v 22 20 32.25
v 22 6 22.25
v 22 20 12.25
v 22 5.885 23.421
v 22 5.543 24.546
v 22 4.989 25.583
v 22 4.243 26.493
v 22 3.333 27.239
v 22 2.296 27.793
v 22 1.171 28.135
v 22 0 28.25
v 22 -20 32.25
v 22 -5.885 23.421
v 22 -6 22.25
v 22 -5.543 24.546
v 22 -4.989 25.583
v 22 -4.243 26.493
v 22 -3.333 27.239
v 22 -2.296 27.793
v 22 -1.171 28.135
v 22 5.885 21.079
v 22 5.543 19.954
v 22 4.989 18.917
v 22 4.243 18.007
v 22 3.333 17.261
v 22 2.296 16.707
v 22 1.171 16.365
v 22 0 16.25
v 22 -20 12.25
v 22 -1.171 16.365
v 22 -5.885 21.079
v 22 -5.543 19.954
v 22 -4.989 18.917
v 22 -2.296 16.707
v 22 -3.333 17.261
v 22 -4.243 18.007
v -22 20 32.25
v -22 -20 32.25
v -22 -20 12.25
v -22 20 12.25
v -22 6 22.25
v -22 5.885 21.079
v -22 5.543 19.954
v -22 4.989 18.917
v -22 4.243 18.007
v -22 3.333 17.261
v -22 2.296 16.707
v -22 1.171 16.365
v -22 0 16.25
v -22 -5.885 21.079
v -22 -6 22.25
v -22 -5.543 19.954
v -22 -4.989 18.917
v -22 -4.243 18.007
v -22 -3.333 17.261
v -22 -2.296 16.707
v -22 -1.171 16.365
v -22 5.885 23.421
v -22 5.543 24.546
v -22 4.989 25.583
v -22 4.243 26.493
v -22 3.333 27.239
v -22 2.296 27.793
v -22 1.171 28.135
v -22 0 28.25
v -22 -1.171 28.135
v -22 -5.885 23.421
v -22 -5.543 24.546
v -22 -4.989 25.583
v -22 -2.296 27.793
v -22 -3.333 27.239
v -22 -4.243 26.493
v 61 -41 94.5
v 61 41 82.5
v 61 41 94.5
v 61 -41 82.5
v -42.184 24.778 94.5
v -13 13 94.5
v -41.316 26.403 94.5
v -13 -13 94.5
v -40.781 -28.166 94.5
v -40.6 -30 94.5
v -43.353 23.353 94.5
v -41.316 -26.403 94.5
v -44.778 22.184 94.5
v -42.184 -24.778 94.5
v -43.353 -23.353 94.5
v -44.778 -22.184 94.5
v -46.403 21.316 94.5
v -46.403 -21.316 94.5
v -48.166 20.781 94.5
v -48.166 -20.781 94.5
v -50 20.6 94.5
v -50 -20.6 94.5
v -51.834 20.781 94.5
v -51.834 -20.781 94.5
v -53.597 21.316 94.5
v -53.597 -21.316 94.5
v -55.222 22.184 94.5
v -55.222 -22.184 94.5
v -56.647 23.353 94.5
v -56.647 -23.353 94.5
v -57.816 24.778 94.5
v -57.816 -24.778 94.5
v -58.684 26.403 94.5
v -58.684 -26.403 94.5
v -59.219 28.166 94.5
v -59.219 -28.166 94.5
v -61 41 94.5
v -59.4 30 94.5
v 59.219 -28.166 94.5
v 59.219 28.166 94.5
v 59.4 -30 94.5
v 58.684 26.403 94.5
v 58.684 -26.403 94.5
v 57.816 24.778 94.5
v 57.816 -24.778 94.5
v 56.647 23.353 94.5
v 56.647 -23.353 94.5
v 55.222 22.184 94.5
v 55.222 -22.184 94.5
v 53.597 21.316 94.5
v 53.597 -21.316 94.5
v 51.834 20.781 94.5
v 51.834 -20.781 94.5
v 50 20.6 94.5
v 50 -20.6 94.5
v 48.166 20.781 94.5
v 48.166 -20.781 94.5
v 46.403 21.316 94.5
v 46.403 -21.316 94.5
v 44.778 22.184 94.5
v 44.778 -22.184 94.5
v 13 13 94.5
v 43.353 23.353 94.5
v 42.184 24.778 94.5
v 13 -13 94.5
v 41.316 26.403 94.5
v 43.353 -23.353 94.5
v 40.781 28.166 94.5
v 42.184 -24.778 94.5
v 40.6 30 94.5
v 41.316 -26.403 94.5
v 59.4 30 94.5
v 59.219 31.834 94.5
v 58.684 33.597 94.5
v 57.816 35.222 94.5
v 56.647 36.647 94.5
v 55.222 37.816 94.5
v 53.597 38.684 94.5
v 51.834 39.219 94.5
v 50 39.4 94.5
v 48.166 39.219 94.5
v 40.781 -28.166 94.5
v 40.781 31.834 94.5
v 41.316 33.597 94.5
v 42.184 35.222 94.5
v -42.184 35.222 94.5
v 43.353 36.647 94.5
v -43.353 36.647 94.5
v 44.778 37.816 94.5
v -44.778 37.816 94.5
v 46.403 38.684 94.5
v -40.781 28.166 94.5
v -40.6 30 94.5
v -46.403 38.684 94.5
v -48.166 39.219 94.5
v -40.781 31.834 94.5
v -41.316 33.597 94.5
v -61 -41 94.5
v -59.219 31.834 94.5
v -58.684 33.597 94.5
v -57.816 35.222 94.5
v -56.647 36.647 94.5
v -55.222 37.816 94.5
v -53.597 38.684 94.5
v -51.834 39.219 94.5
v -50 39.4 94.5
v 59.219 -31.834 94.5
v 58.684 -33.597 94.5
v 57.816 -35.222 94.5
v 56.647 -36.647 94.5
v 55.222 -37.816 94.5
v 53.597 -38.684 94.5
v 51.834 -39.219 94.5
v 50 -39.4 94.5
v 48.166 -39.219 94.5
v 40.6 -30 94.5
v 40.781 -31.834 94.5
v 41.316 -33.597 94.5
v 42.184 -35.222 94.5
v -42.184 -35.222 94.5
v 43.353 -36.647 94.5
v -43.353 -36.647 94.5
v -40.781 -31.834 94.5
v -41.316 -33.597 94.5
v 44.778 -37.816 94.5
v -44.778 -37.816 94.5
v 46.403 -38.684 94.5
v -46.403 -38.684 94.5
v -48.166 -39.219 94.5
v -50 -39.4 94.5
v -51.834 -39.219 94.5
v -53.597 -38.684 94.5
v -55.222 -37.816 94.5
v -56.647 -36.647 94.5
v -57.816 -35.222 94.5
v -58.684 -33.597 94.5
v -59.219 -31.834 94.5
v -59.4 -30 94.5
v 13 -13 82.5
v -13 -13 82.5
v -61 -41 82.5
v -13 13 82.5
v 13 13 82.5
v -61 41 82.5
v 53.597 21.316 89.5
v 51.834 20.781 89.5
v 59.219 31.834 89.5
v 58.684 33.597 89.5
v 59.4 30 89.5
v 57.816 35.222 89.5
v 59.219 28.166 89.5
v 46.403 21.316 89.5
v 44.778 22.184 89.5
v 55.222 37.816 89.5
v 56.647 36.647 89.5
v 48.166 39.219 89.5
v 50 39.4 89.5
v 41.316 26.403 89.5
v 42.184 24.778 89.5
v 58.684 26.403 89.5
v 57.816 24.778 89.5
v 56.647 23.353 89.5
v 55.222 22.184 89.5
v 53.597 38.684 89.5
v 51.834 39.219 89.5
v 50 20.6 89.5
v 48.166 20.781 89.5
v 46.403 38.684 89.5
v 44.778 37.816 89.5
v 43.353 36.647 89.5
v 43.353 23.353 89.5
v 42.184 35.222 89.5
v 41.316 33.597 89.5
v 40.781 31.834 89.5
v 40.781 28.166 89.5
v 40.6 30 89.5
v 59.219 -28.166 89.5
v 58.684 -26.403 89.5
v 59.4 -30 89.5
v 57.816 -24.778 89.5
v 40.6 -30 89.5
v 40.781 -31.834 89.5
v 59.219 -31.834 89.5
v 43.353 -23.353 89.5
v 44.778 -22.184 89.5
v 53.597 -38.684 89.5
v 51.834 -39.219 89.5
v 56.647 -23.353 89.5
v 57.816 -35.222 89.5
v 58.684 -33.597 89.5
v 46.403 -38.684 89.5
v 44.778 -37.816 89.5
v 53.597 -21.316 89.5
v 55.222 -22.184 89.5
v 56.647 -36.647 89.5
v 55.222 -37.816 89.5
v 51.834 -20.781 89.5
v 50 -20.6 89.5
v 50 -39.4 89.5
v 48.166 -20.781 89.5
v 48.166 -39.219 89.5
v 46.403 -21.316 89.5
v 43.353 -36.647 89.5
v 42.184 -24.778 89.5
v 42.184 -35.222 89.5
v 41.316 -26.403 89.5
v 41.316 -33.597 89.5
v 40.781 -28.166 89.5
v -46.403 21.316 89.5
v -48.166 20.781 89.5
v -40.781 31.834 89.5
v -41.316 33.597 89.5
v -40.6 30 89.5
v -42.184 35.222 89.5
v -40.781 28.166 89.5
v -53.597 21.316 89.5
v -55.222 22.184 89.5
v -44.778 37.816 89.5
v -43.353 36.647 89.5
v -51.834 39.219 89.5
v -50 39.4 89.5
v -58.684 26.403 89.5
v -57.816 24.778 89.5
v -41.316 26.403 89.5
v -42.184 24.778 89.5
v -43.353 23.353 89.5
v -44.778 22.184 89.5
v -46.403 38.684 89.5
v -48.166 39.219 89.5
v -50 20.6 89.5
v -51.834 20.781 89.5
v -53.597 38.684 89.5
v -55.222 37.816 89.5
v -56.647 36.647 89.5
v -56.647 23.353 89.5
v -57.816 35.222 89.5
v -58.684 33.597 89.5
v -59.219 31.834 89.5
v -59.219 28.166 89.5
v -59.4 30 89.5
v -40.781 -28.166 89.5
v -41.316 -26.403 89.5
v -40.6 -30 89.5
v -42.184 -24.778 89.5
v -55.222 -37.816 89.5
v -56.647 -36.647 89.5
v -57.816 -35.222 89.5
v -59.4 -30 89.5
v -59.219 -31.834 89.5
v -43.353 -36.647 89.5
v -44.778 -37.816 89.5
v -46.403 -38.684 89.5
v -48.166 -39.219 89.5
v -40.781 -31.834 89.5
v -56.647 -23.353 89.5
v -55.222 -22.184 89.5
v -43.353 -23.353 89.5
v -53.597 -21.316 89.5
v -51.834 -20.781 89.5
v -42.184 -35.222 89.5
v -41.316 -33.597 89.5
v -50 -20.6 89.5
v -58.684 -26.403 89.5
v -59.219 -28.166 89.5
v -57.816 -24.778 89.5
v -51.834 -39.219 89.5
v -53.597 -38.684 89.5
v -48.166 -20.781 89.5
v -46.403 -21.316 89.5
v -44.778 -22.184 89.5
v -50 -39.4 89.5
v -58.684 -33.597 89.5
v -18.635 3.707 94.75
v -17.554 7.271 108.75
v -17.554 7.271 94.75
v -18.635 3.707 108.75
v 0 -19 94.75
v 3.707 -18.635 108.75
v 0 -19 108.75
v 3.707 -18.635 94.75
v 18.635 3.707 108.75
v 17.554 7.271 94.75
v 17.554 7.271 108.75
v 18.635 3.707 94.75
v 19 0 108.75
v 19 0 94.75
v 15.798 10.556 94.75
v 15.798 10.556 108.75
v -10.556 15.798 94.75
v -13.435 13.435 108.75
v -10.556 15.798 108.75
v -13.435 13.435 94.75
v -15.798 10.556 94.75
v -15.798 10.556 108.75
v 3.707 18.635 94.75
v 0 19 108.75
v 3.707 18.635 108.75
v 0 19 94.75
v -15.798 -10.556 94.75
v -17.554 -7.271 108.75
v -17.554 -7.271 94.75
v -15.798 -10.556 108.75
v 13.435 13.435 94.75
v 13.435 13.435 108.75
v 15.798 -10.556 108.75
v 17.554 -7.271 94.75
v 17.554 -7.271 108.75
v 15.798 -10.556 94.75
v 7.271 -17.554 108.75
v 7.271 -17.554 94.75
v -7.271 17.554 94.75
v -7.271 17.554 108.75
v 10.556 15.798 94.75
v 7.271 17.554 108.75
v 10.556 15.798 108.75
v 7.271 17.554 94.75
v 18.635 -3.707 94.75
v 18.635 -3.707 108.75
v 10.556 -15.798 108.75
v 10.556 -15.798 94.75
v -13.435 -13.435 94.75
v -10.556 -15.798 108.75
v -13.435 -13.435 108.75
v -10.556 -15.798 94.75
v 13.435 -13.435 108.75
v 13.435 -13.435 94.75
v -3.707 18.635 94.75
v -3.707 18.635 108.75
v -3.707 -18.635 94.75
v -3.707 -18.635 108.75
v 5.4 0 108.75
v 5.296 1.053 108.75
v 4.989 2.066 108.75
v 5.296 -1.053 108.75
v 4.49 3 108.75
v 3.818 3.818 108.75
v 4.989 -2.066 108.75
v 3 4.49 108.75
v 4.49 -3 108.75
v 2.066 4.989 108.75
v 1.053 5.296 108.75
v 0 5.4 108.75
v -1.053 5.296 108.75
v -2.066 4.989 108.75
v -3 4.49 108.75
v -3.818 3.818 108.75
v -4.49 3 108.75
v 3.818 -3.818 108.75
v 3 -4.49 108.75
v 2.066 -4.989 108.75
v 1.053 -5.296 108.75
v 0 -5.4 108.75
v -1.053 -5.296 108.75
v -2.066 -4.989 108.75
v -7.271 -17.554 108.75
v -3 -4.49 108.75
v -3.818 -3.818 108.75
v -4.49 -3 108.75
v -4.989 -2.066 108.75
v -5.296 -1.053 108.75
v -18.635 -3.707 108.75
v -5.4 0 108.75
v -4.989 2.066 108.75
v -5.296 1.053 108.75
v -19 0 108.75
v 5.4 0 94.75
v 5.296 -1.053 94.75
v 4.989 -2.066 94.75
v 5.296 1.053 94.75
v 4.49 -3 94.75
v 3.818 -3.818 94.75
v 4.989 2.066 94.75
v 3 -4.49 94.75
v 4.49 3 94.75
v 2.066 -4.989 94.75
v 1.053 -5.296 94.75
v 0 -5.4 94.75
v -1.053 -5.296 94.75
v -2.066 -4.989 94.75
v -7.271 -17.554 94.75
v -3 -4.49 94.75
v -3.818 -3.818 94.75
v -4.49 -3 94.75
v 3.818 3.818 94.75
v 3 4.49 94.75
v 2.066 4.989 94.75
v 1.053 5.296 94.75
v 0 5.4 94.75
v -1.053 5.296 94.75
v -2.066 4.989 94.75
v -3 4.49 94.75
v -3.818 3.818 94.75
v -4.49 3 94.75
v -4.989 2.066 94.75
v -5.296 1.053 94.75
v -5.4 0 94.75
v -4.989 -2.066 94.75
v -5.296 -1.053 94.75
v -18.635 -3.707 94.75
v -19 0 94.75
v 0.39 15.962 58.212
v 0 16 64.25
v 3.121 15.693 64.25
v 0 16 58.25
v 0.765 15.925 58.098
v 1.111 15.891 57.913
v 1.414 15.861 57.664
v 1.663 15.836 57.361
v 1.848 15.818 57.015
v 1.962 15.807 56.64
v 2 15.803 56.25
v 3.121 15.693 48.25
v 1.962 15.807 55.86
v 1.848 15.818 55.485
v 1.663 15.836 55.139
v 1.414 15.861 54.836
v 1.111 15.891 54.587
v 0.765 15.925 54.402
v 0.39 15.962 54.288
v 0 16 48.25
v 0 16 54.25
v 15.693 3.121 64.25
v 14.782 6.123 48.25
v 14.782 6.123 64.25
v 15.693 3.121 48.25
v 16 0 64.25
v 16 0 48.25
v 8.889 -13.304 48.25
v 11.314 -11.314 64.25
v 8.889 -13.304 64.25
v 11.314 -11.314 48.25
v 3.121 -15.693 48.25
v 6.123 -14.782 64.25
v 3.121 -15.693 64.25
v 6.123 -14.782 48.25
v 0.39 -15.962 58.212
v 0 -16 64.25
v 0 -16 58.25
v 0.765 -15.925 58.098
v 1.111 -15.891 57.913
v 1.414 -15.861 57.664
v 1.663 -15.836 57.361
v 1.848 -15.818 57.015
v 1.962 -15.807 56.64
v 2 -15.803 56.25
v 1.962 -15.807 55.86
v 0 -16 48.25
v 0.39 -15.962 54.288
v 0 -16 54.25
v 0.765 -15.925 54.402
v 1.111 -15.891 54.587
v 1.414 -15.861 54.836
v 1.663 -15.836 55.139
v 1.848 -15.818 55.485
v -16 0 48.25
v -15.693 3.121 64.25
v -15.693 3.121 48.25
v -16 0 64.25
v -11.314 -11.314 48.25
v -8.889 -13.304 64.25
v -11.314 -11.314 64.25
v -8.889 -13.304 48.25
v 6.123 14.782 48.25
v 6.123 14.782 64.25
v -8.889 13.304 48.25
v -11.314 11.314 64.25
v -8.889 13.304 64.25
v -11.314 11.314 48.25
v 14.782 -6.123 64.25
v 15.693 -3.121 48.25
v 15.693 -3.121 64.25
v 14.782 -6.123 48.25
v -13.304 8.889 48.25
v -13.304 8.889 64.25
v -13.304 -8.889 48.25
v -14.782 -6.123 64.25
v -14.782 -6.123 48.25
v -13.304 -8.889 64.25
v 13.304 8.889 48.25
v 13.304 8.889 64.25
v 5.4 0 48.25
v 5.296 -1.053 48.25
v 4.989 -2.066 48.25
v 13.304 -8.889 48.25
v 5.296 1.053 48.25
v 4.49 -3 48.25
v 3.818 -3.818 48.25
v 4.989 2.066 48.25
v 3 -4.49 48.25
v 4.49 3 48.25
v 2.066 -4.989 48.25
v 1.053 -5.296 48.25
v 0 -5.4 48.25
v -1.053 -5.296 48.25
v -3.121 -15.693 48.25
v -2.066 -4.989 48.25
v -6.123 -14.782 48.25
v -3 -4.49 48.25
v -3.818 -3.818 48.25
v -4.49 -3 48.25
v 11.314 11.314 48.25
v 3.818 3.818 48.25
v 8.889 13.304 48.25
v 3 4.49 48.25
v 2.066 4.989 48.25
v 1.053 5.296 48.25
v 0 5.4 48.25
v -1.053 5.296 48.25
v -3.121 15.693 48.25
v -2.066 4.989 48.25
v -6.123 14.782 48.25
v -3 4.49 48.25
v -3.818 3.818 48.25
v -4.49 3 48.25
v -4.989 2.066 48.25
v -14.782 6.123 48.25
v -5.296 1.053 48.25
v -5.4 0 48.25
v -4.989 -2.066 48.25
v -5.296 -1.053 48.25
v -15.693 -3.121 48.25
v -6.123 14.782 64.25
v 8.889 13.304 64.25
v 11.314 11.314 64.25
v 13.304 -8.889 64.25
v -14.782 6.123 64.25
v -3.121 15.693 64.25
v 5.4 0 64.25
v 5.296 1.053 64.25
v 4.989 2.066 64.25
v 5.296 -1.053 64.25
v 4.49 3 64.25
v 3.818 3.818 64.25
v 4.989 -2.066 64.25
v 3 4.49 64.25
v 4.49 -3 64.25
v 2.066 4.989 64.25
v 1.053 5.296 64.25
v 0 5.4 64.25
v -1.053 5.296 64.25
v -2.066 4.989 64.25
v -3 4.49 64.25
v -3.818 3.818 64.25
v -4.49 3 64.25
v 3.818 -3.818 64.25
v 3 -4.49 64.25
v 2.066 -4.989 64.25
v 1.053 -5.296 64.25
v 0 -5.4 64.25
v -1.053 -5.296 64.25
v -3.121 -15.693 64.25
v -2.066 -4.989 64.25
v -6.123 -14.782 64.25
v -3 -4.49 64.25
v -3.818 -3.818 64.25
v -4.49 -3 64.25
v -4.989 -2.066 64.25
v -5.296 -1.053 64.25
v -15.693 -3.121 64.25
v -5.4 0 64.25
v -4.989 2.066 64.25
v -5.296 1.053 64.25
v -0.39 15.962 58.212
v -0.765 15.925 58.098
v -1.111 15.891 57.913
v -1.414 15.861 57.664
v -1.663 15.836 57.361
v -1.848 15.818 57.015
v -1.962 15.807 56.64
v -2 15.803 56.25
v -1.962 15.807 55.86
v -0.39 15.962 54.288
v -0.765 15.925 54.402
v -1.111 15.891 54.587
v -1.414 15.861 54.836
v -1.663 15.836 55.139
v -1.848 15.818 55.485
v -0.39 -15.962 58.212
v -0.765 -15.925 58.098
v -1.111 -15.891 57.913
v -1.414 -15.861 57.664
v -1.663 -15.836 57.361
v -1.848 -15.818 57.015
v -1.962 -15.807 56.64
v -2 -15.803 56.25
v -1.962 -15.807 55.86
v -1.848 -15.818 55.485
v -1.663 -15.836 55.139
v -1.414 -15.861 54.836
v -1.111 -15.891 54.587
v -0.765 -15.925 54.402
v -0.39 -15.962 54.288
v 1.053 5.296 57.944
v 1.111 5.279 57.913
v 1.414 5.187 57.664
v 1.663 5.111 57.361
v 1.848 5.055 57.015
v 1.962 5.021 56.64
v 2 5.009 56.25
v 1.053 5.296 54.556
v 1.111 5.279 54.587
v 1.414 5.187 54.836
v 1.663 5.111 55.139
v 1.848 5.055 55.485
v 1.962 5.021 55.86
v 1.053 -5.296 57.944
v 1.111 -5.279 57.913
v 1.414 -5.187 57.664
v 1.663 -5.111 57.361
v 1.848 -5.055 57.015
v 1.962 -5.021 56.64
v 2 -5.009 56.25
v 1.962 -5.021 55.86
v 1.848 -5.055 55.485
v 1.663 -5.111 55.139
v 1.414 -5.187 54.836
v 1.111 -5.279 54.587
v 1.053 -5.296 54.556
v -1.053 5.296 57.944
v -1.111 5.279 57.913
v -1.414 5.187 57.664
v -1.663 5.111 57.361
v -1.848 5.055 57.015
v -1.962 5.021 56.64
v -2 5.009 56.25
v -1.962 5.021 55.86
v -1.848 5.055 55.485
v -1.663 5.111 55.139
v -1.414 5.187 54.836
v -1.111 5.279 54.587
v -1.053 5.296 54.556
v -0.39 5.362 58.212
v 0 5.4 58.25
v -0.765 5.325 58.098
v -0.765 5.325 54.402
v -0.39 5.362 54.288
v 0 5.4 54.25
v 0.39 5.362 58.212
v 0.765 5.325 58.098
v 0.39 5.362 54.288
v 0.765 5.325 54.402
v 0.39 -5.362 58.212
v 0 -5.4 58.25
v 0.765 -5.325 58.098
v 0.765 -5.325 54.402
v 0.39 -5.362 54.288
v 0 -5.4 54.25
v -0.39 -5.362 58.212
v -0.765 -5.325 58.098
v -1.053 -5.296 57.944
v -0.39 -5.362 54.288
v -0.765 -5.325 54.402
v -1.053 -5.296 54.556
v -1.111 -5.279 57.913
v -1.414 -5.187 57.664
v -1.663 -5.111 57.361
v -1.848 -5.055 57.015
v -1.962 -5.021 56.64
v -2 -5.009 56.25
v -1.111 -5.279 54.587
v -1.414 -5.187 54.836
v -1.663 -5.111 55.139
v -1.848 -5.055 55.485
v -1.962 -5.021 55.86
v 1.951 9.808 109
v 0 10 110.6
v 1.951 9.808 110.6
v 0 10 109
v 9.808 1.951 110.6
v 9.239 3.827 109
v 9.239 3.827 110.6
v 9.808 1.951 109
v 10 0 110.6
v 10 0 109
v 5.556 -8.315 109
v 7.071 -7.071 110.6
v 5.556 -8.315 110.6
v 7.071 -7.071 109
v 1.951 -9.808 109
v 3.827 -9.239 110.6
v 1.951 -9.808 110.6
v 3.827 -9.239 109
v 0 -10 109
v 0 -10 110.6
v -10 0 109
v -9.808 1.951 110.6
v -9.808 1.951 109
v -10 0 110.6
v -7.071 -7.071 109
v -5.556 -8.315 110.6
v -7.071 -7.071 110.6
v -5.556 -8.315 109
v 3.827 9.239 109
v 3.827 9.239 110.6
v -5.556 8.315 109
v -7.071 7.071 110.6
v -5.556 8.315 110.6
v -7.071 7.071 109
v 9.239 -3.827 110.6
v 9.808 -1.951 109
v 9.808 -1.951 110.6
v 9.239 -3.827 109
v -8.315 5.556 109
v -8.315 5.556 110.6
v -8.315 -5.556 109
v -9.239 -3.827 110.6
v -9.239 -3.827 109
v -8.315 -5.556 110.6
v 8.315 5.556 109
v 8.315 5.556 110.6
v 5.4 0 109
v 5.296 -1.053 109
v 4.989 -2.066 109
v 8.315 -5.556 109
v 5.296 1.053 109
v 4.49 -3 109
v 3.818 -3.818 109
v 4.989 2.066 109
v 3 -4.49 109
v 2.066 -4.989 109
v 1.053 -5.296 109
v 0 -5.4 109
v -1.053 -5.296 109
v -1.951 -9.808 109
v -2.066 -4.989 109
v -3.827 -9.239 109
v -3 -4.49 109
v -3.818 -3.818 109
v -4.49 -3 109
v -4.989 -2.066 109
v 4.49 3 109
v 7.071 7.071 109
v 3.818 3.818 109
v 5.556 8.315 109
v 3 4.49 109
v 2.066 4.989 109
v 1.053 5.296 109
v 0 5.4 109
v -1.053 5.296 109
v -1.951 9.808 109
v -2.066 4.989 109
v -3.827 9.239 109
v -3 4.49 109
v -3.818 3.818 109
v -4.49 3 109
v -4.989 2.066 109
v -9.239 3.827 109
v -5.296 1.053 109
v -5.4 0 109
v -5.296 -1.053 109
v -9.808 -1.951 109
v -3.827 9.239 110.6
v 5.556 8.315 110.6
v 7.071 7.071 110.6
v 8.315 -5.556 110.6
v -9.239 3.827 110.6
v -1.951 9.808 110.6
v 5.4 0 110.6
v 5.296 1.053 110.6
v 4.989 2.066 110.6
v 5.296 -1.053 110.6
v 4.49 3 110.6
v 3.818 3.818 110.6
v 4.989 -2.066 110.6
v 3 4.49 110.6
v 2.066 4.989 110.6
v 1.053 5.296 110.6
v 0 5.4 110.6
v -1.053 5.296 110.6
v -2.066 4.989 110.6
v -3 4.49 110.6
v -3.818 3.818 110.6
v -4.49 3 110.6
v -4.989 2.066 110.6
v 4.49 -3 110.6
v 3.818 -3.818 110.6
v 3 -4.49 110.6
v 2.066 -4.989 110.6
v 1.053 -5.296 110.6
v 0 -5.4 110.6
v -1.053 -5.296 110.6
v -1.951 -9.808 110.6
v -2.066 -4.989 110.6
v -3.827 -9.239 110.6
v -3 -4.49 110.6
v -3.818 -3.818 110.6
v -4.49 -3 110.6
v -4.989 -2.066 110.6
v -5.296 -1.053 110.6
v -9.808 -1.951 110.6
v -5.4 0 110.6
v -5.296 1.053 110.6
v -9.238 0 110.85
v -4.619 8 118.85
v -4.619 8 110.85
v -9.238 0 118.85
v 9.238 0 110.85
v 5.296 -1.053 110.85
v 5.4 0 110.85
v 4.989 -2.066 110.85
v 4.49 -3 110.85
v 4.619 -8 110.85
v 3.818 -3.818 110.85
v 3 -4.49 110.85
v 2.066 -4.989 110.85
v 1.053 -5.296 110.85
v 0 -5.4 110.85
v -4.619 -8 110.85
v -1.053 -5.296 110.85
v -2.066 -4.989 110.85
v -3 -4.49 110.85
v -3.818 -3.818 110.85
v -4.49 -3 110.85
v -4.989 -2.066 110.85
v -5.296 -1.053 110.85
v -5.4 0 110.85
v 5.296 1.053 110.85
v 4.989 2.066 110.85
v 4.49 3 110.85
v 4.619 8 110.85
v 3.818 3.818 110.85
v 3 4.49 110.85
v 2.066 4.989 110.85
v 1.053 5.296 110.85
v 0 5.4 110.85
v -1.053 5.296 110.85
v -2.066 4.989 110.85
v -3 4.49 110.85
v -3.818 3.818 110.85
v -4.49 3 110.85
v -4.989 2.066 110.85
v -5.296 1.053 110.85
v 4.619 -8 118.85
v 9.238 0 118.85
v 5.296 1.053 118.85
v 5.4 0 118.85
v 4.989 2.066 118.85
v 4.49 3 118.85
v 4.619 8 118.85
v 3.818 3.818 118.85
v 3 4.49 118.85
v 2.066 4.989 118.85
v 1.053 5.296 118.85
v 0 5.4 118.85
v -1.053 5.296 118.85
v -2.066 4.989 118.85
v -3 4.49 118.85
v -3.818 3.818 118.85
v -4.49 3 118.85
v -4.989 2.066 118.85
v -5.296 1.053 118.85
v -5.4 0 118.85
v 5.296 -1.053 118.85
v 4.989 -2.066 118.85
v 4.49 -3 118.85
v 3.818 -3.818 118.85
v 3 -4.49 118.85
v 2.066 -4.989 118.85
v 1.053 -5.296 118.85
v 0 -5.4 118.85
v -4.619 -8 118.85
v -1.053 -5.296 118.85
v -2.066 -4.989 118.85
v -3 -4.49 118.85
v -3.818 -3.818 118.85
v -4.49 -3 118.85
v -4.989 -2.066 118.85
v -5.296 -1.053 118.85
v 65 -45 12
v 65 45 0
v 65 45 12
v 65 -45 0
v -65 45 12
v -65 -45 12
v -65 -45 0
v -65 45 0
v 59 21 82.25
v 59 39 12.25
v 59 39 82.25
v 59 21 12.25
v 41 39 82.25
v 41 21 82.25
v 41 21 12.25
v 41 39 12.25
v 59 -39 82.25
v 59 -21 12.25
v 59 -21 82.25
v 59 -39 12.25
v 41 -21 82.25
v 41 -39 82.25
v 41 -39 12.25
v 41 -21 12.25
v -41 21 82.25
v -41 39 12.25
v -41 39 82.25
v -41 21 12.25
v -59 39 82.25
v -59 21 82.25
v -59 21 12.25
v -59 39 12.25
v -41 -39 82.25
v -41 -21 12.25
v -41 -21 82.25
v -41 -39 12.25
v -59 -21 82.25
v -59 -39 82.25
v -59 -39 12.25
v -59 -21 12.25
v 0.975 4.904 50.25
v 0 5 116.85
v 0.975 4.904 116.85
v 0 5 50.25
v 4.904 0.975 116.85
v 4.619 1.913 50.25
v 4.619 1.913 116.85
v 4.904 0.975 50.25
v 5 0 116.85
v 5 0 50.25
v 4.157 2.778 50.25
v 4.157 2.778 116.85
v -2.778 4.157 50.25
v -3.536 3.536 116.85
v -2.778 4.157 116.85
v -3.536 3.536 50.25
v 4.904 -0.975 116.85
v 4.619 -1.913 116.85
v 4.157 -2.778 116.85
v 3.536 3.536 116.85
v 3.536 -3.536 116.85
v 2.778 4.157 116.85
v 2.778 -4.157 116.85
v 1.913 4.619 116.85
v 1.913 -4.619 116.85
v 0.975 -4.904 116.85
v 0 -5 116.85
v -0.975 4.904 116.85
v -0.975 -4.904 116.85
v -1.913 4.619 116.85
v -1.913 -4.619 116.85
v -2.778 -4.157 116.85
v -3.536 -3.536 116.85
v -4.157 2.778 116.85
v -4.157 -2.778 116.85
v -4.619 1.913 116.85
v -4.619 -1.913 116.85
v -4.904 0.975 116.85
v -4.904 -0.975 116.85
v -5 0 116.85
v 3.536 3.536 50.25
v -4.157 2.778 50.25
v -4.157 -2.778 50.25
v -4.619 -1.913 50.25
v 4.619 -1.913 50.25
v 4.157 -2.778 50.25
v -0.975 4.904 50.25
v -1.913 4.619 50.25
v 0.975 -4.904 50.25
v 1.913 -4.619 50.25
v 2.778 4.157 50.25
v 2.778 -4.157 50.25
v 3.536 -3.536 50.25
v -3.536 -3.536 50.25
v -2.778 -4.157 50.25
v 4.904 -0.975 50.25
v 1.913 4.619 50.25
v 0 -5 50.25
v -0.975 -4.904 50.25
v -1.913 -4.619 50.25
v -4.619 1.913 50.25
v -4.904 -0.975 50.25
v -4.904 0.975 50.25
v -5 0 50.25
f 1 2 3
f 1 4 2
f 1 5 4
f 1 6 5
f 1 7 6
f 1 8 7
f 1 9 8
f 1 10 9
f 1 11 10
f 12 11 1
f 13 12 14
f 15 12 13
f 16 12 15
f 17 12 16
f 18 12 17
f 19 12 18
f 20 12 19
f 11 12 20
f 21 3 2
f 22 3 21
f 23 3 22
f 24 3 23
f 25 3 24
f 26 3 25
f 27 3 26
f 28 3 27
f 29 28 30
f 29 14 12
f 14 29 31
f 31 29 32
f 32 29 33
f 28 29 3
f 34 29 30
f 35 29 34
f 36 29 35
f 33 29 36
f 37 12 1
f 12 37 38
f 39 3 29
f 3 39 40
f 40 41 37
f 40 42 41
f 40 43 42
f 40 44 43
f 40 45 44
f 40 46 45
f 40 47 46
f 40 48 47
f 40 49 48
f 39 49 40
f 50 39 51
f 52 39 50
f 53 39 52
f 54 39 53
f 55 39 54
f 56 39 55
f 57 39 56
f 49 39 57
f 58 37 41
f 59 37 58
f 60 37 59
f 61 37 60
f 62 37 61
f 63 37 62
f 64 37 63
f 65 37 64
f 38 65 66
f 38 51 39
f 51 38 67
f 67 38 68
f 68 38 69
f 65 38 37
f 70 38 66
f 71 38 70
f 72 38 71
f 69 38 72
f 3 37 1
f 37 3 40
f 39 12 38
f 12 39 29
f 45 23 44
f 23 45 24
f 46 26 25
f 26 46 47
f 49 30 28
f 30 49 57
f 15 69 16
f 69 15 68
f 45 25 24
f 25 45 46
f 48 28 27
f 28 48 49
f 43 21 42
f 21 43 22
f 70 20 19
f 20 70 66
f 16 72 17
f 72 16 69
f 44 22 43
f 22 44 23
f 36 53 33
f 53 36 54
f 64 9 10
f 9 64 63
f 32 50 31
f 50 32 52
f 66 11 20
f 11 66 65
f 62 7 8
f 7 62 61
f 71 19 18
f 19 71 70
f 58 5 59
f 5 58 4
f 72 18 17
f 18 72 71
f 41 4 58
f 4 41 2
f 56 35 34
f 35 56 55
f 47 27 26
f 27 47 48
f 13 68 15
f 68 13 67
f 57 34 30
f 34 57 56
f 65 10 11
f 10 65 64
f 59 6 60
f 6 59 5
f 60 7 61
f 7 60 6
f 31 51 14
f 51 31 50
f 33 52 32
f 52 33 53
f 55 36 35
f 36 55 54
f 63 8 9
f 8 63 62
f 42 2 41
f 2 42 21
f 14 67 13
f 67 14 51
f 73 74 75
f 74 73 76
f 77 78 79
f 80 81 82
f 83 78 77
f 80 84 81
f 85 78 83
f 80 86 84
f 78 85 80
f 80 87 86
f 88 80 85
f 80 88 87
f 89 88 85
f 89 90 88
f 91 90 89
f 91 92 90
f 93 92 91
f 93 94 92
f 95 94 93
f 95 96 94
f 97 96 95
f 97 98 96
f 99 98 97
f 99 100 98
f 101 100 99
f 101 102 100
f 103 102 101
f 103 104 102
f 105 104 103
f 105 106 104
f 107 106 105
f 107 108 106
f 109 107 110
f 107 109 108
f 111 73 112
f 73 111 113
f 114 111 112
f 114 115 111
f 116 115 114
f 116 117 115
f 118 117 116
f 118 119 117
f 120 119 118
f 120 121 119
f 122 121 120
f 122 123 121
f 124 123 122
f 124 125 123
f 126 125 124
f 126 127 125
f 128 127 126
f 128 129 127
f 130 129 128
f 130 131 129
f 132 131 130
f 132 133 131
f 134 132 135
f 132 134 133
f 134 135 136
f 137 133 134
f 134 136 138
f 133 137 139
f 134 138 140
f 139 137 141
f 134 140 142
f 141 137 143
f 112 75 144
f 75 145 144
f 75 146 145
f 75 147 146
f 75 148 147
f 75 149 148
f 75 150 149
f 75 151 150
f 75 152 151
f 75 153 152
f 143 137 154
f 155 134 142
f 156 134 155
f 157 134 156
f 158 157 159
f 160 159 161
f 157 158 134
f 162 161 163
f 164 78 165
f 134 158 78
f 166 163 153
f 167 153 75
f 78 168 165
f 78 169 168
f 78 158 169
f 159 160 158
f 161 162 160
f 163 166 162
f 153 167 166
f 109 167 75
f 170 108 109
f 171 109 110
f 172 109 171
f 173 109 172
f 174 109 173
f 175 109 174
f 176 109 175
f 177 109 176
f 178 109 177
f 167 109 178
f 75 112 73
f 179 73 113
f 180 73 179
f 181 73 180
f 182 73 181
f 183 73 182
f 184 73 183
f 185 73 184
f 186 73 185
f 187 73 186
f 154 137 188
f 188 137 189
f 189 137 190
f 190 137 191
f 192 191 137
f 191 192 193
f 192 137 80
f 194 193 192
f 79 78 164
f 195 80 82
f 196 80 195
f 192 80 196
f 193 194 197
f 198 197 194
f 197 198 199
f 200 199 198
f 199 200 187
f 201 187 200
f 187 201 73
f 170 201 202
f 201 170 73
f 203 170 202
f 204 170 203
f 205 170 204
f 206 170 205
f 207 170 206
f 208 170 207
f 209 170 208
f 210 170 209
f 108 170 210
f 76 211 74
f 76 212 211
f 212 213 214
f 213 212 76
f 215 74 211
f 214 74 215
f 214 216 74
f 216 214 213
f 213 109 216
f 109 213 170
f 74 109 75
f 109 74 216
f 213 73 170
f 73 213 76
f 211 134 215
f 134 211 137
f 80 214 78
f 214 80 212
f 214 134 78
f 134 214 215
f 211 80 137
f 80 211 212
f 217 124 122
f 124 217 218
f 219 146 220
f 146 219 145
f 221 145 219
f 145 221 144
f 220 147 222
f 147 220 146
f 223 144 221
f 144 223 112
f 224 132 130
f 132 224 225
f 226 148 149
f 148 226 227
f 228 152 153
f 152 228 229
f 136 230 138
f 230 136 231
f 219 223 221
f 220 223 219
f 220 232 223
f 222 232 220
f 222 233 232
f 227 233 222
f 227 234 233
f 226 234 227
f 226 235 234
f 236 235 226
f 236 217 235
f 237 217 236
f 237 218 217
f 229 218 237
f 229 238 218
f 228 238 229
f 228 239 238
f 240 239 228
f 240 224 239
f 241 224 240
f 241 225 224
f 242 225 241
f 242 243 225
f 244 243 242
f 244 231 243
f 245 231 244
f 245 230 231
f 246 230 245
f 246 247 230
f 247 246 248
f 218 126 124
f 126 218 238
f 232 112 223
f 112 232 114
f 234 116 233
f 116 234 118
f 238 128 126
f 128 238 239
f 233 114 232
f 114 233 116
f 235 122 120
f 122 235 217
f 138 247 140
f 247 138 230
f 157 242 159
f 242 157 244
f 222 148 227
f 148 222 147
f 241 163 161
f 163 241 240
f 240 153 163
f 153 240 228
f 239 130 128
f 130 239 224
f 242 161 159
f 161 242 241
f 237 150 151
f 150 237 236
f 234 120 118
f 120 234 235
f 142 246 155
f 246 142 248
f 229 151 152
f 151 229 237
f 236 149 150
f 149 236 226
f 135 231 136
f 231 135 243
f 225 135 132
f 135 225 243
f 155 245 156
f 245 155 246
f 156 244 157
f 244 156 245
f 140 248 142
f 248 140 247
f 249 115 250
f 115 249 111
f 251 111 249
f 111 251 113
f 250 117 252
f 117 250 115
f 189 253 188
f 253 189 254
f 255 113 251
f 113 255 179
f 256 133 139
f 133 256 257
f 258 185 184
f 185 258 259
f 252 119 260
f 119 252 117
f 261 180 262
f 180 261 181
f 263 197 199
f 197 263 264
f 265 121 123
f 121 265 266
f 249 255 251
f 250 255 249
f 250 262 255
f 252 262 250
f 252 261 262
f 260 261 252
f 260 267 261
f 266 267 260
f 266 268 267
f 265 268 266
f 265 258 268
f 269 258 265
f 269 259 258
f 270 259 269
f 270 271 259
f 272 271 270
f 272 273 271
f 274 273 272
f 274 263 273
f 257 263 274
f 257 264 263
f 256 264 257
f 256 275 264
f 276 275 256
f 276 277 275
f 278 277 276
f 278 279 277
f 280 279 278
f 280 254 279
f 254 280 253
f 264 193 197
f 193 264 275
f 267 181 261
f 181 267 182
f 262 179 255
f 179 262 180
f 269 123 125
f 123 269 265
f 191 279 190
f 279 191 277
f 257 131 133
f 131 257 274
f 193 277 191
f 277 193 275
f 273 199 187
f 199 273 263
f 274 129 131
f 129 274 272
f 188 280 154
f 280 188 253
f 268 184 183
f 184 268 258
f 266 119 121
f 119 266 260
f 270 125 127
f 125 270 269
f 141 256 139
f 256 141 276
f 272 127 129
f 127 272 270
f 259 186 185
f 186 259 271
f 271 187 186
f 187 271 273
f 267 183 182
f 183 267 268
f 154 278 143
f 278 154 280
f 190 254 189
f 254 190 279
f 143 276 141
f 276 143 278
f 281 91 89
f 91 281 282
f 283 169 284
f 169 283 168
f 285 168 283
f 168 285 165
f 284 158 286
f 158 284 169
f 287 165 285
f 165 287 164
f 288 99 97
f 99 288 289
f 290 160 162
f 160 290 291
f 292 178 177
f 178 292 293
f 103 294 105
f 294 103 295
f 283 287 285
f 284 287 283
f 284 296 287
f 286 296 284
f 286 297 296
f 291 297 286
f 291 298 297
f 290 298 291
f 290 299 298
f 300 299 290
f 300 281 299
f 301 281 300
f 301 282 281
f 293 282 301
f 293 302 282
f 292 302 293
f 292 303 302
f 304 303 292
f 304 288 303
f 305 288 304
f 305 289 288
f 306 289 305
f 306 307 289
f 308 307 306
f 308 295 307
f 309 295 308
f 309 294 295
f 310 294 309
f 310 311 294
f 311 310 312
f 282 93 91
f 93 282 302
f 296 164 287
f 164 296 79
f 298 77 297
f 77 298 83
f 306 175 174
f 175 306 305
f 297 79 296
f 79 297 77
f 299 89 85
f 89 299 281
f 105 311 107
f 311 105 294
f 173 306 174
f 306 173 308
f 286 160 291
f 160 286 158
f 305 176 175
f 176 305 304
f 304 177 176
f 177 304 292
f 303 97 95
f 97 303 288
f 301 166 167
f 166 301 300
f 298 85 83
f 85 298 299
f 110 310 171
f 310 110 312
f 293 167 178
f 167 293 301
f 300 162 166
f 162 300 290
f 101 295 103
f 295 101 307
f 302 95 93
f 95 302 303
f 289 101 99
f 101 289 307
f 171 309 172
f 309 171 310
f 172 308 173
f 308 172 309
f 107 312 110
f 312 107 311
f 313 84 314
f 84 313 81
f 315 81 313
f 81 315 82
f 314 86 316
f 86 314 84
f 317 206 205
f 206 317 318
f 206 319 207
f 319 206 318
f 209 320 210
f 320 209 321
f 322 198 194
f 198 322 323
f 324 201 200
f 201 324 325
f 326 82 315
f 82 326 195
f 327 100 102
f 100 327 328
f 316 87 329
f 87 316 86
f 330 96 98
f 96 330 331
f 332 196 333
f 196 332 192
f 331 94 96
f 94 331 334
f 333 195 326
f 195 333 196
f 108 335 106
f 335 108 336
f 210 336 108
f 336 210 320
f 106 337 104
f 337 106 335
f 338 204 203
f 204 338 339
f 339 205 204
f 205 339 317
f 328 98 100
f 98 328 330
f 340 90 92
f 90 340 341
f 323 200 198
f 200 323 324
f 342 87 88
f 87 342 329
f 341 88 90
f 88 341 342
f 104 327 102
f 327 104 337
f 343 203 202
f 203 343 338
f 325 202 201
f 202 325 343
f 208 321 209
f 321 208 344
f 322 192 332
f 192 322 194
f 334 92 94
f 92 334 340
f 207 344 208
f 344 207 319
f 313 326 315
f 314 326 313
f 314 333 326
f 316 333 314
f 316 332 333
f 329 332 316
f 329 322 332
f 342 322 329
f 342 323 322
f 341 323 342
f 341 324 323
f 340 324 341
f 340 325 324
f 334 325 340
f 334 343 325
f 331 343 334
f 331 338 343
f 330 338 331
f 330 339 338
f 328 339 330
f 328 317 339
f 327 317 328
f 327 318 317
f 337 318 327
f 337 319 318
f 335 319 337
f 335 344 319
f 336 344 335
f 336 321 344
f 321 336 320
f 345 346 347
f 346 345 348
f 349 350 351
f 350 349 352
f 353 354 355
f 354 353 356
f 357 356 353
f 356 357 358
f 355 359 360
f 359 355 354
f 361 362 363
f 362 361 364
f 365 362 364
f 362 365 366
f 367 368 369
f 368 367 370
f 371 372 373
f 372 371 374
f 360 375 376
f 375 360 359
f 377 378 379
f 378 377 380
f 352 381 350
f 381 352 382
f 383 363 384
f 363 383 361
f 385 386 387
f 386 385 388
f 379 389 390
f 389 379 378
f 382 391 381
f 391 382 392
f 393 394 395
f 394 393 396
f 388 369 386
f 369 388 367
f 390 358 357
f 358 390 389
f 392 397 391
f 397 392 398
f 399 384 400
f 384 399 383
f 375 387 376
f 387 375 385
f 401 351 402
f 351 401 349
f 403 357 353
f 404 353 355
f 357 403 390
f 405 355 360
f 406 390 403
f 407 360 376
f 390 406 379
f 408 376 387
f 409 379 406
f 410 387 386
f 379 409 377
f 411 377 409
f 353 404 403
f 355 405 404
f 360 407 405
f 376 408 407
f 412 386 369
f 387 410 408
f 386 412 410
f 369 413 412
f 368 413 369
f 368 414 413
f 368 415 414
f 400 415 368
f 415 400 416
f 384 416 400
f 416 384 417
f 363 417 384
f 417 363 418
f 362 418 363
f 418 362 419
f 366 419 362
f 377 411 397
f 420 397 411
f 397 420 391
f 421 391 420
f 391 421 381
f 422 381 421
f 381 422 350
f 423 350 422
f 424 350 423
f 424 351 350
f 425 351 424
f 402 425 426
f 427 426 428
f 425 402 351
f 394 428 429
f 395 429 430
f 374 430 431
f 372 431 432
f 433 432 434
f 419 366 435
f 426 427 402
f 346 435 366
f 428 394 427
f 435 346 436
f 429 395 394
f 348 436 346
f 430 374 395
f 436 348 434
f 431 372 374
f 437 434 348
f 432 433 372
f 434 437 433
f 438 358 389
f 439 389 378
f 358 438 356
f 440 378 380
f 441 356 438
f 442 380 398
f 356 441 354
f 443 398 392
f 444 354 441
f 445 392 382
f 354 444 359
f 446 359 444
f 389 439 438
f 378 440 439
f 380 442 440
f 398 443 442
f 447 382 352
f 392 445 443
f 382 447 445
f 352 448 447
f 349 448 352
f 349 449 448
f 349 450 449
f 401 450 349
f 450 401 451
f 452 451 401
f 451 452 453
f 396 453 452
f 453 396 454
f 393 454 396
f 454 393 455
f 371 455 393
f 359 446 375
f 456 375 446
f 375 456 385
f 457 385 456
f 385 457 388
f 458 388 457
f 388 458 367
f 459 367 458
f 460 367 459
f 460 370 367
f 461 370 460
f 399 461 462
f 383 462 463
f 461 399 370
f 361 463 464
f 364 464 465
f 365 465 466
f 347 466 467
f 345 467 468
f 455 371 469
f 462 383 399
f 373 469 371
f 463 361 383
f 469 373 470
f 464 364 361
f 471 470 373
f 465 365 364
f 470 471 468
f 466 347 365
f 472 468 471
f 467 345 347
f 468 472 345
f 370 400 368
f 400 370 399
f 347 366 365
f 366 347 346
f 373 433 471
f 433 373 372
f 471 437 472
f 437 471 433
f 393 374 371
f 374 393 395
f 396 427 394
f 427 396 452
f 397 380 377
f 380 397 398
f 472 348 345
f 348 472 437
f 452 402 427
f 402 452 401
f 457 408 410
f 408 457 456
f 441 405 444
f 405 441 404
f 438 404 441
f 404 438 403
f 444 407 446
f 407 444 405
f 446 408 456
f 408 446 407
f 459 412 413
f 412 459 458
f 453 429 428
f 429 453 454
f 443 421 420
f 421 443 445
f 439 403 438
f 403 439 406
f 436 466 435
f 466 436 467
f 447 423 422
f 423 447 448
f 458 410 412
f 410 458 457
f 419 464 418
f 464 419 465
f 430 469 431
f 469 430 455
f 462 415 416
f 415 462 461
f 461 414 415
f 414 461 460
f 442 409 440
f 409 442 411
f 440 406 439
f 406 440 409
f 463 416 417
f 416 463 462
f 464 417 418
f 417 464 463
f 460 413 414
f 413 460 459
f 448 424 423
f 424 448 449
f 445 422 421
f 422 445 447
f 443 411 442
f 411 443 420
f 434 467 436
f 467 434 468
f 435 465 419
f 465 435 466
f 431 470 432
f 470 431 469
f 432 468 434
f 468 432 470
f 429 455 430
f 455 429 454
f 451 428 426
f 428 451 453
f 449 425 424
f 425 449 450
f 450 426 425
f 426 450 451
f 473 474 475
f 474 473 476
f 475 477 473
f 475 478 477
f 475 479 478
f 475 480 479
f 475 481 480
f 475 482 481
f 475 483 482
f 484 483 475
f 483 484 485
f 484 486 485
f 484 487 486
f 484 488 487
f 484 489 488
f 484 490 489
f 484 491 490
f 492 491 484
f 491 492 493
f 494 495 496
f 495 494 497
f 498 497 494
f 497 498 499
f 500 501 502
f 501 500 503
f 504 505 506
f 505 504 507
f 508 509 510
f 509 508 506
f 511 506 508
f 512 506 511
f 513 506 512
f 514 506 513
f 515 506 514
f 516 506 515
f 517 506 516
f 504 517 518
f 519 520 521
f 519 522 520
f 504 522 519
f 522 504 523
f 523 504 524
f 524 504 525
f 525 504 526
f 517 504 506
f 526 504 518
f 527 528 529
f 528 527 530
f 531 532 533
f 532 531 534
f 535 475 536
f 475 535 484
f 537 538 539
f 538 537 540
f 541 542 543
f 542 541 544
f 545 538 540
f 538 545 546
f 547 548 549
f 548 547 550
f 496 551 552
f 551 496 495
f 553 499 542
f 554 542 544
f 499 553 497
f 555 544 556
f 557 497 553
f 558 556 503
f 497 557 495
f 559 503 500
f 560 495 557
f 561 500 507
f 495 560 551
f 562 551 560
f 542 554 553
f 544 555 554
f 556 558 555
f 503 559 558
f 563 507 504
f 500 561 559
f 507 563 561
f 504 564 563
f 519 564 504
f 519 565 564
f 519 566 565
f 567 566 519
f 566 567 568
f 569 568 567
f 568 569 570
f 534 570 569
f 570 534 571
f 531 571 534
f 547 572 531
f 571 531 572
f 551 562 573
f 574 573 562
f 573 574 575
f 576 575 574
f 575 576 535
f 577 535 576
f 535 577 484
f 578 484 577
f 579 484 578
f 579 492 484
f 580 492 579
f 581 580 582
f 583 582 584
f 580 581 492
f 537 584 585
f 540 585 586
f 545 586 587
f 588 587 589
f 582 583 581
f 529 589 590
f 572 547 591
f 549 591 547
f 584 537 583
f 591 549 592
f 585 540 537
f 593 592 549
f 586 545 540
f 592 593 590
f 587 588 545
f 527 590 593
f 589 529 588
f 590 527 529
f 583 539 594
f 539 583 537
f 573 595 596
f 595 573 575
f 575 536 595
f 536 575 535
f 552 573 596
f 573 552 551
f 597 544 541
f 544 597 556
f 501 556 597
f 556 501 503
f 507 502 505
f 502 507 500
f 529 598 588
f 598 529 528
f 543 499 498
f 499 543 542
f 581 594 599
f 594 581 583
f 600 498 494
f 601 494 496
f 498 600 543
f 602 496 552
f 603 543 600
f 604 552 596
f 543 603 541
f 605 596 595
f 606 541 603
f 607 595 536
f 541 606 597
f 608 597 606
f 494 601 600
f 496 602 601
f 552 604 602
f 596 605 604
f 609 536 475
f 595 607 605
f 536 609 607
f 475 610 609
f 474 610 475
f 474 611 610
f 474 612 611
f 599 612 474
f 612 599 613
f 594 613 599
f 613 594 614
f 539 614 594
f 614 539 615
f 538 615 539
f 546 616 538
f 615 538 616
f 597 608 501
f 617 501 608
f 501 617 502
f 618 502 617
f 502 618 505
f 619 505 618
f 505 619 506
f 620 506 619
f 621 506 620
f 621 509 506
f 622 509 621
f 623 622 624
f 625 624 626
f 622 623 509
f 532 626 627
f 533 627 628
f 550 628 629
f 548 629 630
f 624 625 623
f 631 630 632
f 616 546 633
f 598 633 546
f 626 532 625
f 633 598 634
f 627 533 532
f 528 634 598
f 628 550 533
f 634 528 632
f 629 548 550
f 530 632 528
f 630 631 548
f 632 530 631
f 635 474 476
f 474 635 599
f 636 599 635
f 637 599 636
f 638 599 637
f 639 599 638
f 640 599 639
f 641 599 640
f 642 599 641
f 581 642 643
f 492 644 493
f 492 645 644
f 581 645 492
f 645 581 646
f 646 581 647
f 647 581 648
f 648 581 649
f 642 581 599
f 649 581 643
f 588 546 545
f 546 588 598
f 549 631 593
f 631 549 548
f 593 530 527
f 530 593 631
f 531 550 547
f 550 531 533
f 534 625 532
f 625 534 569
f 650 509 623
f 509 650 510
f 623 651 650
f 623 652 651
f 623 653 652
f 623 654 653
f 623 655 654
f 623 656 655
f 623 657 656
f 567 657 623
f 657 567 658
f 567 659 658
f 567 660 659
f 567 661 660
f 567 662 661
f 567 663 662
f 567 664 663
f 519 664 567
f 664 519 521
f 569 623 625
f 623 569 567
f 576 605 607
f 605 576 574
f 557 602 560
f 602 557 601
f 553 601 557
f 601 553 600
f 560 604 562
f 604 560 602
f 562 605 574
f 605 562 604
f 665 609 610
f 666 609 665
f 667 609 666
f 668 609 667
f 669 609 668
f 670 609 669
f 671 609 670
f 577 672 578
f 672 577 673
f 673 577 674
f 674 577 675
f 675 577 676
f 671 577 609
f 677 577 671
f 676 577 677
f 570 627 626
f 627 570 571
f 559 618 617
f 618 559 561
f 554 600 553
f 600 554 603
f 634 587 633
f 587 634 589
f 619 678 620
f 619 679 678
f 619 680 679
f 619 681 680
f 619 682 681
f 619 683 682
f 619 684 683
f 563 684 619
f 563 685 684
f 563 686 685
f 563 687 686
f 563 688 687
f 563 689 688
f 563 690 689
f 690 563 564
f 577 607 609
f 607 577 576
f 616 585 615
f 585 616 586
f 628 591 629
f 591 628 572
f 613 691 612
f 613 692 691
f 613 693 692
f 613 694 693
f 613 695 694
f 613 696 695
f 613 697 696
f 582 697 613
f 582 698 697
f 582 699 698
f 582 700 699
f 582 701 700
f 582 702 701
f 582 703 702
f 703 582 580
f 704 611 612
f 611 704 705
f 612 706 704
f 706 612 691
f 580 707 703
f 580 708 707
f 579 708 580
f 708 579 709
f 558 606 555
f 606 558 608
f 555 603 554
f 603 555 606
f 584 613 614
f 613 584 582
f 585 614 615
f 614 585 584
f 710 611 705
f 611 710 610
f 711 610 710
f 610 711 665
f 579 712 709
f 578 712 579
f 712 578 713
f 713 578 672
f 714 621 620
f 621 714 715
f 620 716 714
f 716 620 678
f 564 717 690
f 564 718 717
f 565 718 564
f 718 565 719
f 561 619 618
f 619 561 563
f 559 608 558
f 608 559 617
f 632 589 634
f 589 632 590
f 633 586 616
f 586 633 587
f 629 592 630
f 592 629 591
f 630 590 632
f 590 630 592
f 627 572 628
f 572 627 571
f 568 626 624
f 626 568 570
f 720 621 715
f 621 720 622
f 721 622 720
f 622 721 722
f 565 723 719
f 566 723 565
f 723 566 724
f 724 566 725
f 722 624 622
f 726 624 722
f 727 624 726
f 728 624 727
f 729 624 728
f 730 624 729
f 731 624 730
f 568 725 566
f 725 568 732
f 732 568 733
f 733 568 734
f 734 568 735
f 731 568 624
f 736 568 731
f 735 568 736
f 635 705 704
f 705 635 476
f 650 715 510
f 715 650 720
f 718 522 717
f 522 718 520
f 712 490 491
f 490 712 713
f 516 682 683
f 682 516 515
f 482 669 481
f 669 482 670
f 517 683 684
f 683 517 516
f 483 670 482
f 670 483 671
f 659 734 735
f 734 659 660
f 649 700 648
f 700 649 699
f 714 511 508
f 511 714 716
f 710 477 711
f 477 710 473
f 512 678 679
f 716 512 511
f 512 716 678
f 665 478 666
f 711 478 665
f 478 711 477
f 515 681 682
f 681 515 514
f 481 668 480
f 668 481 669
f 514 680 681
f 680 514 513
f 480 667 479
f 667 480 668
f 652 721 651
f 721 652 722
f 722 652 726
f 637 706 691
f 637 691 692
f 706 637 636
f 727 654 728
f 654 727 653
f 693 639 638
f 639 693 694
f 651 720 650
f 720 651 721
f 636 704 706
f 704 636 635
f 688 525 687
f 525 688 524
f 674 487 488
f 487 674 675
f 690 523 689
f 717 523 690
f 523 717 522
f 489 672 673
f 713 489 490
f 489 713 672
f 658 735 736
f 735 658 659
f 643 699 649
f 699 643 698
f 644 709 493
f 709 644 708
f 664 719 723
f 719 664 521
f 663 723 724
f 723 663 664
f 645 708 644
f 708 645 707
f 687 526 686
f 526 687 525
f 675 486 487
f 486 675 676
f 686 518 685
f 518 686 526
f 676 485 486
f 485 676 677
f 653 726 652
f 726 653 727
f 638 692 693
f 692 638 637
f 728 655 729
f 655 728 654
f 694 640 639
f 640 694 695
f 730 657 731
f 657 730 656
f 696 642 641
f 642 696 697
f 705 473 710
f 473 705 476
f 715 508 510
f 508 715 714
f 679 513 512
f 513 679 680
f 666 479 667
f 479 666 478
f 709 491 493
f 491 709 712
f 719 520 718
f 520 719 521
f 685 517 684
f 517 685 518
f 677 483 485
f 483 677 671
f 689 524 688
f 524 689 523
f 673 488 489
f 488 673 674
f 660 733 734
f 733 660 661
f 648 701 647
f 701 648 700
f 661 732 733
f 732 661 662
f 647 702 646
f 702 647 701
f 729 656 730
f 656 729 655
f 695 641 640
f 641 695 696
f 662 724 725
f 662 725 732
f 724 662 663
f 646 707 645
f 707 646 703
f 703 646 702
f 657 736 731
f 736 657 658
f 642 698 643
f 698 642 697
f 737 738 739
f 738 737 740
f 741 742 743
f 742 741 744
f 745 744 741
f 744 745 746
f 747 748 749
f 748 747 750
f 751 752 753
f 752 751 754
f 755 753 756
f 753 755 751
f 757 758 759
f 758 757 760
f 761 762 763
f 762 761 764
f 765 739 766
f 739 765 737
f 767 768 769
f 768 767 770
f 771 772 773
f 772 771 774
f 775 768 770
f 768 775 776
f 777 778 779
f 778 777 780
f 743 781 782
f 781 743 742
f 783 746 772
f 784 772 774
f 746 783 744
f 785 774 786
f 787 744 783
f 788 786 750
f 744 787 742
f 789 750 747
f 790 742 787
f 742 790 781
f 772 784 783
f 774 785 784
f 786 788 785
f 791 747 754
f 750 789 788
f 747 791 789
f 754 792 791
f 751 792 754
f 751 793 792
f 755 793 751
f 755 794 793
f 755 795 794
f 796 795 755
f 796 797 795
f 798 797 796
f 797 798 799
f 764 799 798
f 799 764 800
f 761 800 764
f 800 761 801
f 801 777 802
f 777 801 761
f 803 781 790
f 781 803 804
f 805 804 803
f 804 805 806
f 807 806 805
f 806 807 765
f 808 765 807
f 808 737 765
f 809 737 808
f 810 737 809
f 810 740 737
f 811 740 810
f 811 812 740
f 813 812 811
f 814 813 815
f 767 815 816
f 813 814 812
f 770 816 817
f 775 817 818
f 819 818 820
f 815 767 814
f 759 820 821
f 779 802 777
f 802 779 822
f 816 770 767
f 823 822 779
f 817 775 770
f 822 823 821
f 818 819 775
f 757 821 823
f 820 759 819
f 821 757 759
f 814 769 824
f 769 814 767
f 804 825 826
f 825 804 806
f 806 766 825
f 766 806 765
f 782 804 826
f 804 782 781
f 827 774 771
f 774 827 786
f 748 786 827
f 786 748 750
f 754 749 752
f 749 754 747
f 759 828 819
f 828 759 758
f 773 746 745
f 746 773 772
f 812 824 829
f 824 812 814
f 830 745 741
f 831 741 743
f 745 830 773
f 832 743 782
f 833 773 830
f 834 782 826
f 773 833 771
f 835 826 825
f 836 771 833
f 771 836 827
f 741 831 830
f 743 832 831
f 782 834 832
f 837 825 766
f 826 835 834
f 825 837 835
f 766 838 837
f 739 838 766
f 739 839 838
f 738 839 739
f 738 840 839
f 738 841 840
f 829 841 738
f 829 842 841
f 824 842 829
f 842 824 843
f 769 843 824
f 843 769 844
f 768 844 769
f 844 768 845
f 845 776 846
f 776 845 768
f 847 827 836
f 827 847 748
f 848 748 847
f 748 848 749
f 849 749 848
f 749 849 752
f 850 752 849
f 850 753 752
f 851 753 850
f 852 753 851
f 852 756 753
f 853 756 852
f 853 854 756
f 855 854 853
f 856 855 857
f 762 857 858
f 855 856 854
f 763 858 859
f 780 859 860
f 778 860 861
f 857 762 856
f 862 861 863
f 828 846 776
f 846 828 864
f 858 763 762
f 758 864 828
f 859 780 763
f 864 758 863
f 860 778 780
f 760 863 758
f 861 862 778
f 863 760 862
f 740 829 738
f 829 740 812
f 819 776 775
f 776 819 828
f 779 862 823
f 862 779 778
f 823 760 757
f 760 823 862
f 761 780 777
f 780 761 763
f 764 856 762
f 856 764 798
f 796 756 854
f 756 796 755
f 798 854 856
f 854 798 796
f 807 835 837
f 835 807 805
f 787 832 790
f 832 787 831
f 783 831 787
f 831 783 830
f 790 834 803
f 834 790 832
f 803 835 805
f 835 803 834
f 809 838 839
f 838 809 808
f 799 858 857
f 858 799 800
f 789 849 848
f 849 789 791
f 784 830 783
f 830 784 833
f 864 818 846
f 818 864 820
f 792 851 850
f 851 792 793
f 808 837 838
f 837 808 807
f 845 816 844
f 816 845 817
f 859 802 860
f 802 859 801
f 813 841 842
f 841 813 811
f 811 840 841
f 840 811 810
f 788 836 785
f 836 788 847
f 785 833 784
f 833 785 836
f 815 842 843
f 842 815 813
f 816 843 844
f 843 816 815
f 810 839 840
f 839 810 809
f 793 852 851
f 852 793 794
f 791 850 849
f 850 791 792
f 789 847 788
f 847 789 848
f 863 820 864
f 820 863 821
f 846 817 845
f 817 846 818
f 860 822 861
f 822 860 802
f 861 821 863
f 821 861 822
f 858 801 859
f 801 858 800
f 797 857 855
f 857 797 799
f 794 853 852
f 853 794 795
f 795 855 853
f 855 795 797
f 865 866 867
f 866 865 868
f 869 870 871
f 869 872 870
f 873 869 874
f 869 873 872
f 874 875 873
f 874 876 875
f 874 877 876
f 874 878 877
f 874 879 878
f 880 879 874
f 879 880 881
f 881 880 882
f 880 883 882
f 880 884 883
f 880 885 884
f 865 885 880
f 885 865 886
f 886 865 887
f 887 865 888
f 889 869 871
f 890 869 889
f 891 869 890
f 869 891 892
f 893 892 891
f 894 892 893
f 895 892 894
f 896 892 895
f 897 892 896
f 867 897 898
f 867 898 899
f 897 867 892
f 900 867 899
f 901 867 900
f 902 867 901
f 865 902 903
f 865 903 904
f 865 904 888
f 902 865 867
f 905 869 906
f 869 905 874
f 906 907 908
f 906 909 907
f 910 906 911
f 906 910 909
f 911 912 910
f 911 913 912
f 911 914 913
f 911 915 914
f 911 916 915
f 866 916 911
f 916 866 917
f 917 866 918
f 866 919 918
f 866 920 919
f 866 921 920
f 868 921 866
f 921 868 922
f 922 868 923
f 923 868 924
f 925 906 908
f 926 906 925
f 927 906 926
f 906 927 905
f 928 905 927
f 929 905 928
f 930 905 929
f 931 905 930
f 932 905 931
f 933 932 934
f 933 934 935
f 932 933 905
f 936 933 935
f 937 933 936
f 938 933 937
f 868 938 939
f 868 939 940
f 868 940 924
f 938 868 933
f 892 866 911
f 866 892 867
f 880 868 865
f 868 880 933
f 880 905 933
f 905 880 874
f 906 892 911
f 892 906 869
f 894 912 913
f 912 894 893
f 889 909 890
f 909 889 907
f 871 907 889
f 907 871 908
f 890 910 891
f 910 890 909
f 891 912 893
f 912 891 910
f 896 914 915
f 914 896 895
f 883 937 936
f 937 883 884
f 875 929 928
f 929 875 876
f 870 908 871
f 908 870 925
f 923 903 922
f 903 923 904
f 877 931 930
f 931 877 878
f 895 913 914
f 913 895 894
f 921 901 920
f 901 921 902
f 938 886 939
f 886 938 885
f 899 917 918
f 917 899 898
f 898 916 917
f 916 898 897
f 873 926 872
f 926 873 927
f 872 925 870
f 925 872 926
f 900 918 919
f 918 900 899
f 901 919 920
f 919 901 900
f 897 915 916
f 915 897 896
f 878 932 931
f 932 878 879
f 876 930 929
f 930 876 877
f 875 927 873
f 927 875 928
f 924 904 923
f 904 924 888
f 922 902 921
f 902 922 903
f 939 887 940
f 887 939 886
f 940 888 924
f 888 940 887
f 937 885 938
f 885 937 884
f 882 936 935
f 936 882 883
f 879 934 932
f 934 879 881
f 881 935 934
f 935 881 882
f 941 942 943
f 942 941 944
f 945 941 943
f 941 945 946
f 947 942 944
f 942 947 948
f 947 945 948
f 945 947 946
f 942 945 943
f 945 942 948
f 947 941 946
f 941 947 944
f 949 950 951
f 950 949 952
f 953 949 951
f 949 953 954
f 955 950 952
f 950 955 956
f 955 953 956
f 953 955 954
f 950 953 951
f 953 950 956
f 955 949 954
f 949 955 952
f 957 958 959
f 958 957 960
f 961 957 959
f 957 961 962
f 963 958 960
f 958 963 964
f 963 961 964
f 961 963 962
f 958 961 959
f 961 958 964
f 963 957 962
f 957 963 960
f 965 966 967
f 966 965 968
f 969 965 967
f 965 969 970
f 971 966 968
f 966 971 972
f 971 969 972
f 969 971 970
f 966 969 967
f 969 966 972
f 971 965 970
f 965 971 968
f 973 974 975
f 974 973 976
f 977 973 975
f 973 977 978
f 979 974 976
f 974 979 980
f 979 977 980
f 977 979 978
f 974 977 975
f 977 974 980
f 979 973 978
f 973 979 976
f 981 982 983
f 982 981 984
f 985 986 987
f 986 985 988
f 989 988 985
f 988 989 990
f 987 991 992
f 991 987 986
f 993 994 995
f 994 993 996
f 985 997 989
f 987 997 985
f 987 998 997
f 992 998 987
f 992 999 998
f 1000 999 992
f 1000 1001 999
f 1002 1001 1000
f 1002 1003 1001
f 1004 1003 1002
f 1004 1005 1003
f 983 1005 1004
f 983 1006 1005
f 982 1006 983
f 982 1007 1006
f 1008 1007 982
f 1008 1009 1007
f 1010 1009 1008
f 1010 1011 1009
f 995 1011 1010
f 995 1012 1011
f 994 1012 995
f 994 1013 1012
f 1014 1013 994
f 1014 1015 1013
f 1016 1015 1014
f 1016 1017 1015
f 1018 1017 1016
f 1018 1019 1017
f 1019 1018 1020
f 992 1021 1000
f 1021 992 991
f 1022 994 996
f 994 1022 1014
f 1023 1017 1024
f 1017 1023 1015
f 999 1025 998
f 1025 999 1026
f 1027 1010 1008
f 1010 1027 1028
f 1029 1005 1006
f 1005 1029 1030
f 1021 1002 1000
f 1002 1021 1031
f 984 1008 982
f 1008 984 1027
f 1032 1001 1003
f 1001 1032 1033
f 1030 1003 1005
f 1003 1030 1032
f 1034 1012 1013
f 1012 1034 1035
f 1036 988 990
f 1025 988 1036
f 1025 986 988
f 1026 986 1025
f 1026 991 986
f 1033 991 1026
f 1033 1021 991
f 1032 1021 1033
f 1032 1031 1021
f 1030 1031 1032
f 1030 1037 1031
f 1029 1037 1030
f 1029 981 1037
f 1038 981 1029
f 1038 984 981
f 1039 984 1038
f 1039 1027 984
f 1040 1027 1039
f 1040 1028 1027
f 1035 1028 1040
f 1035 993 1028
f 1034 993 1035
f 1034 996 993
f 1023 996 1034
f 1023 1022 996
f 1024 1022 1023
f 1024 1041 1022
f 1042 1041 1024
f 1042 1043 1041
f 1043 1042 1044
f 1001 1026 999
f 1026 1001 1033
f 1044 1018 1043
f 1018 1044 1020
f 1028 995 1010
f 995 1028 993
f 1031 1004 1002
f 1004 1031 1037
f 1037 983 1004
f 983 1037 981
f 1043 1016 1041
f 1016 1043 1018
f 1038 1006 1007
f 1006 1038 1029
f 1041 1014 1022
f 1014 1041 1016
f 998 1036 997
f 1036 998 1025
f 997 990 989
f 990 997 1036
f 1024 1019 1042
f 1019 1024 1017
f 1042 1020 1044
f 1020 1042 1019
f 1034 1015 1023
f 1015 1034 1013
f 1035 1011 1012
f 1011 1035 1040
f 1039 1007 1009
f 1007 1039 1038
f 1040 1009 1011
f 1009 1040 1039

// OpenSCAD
$fn = 32;

// ------------------------------------------------------------------------
// Arbor press fixture: screw d10, posts 70 mm, gap 16 mm
// Every part is its own module, assembly() places every instance.
// ------------------------------------------------------------------------

// --- part 1 ---
module press_bed() {
  difference() {
    translate([-65, -45, 0]) cube([130, 90, 12]);
  }
}

// --- part 2 ---
module anvil_block() {
  difference() {
    translate([-22, -20, 0]) cube([44, 40, 20]);
    translate([0, 0, 10]) rotate([0, 90, 0]) cylinder(h = 46, d = 12, center = true);
  }
}

// --- part 3 ---
module press_post_a() {
  translate([-9, -9, 0]) cube([18, 18, 70]);
}

// --- part 4 ---
module press_post_b() {
  translate([-9, -9, 0]) cube([18, 18, 70]);
}

// --- part 5 ---
module press_post_c() {
  translate([-9, -9, 0]) cube([18, 18, 70]);
}

// --- part 6 ---
module press_post_d() {
  translate([-9, -9, 0]) cube([18, 18, 70]);
}

// --- part 7 ---
module press_frame() {
  difference() {
    translate([-61, -41, 0]) cube([122, 82, 12]);
    translate([-13, -13, -1]) cube([26, 26, 14]);
    translate([50, 30, 7]) cylinder(h = 6, d = 18.8);
    translate([50, -30, 7]) cylinder(h = 6, d = 18.8);
    translate([-50, 30, 7]) cylinder(h = 6, d = 18.8);
    translate([-50, -30, 7]) cylinder(h = 6, d = 18.8);
  }
}

// --- part 8 ---
module guide_ring() {
  difference() {
      translate([0, 0, 0]) cylinder(h = 14, d = 38);
      translate([0, 0, -1]) cylinder(h = 16, d = 10.8);
    }
}

// --- part 9 ---
module press_screw() {
  translate([0, 0, -33.3]) cylinder(h = 66.6, d = 10);
}

// --- part 10 ---
module press_head() {
  difference() {
    cylinder(h = 16, d = 32);
    translate([0, 0, -1]) cylinder(h = 18, d = 10.8);
    translate([0, 0, 8]) rotate([90, 0, 0]) cylinder(h = 34, d = 4, center = true);
  }
}

// --- part 11 ---
module nut_washer() {
  difference() {
      translate([0, 0, 0]) cylinder(h = 1.6, d = 20);
      translate([0, 0, -1]) cylinder(h = 3.6, d = 10.8);
    }
}

// --- part 12 ---
module press_nut() {
  difference() {
    linear_extrude(height = 8) polygon(points = [[9.238, 0], [4.619, 8], [-4.619, 8], [-9.238, 0], [-4.619, -8], [4.619, -8]]);
    translate([0, 0, -1]) cylinder(h = 10, d = 10.8);
  }
}

// --- assembly ---
module assembly() {
  color([0.80, 0.24, 0.20]) translate([0, 0, 0]) rotate([0, 0, 0]) press_bed();
  color([0.20, 0.45, 0.75]) translate([0, 0, 12.25]) rotate([0, 0, 0]) anvil_block();
  color([0.25, 0.62, 0.32]) translate([50, 30, 12.25]) rotate([0, 0, 0]) press_post_a();
  color([0.92, 0.70, 0.18]) translate([50, -30, 12.25]) rotate([0, 0, 0]) press_post_b();
  color([0.58, 0.35, 0.70]) translate([-50, 30, 12.25]) rotate([0, 0, 0]) press_post_c();
  color([0.16, 0.66, 0.66]) translate([-50, -30, 12.25]) rotate([0, 0, 0]) press_post_d();
  color([0.85, 0.48, 0.18]) translate([0, 0, 82.5]) rotate([0, 0, 0]) press_frame();
  color([0.55, 0.60, 0.65]) translate([0, 0, 94.75]) rotate([0, 0, 0]) guide_ring();
  color([0.75, 0.30, 0.55]) translate([0, 0, 83.55]) rotate([0, 0, 0]) press_screw();
  color([0.42, 0.52, 0.28]) translate([0, 0, 48.25]) rotate([0, 0, 0]) press_head();
  color([0.80, 0.24, 0.20]) translate([0, 0, 109]) rotate([0, 0, 0]) nut_washer();
  color([0.20, 0.45, 0.75]) translate([0, 0, 110.85]) rotate([0, 0, 0]) press_nut();
}

assembly();
